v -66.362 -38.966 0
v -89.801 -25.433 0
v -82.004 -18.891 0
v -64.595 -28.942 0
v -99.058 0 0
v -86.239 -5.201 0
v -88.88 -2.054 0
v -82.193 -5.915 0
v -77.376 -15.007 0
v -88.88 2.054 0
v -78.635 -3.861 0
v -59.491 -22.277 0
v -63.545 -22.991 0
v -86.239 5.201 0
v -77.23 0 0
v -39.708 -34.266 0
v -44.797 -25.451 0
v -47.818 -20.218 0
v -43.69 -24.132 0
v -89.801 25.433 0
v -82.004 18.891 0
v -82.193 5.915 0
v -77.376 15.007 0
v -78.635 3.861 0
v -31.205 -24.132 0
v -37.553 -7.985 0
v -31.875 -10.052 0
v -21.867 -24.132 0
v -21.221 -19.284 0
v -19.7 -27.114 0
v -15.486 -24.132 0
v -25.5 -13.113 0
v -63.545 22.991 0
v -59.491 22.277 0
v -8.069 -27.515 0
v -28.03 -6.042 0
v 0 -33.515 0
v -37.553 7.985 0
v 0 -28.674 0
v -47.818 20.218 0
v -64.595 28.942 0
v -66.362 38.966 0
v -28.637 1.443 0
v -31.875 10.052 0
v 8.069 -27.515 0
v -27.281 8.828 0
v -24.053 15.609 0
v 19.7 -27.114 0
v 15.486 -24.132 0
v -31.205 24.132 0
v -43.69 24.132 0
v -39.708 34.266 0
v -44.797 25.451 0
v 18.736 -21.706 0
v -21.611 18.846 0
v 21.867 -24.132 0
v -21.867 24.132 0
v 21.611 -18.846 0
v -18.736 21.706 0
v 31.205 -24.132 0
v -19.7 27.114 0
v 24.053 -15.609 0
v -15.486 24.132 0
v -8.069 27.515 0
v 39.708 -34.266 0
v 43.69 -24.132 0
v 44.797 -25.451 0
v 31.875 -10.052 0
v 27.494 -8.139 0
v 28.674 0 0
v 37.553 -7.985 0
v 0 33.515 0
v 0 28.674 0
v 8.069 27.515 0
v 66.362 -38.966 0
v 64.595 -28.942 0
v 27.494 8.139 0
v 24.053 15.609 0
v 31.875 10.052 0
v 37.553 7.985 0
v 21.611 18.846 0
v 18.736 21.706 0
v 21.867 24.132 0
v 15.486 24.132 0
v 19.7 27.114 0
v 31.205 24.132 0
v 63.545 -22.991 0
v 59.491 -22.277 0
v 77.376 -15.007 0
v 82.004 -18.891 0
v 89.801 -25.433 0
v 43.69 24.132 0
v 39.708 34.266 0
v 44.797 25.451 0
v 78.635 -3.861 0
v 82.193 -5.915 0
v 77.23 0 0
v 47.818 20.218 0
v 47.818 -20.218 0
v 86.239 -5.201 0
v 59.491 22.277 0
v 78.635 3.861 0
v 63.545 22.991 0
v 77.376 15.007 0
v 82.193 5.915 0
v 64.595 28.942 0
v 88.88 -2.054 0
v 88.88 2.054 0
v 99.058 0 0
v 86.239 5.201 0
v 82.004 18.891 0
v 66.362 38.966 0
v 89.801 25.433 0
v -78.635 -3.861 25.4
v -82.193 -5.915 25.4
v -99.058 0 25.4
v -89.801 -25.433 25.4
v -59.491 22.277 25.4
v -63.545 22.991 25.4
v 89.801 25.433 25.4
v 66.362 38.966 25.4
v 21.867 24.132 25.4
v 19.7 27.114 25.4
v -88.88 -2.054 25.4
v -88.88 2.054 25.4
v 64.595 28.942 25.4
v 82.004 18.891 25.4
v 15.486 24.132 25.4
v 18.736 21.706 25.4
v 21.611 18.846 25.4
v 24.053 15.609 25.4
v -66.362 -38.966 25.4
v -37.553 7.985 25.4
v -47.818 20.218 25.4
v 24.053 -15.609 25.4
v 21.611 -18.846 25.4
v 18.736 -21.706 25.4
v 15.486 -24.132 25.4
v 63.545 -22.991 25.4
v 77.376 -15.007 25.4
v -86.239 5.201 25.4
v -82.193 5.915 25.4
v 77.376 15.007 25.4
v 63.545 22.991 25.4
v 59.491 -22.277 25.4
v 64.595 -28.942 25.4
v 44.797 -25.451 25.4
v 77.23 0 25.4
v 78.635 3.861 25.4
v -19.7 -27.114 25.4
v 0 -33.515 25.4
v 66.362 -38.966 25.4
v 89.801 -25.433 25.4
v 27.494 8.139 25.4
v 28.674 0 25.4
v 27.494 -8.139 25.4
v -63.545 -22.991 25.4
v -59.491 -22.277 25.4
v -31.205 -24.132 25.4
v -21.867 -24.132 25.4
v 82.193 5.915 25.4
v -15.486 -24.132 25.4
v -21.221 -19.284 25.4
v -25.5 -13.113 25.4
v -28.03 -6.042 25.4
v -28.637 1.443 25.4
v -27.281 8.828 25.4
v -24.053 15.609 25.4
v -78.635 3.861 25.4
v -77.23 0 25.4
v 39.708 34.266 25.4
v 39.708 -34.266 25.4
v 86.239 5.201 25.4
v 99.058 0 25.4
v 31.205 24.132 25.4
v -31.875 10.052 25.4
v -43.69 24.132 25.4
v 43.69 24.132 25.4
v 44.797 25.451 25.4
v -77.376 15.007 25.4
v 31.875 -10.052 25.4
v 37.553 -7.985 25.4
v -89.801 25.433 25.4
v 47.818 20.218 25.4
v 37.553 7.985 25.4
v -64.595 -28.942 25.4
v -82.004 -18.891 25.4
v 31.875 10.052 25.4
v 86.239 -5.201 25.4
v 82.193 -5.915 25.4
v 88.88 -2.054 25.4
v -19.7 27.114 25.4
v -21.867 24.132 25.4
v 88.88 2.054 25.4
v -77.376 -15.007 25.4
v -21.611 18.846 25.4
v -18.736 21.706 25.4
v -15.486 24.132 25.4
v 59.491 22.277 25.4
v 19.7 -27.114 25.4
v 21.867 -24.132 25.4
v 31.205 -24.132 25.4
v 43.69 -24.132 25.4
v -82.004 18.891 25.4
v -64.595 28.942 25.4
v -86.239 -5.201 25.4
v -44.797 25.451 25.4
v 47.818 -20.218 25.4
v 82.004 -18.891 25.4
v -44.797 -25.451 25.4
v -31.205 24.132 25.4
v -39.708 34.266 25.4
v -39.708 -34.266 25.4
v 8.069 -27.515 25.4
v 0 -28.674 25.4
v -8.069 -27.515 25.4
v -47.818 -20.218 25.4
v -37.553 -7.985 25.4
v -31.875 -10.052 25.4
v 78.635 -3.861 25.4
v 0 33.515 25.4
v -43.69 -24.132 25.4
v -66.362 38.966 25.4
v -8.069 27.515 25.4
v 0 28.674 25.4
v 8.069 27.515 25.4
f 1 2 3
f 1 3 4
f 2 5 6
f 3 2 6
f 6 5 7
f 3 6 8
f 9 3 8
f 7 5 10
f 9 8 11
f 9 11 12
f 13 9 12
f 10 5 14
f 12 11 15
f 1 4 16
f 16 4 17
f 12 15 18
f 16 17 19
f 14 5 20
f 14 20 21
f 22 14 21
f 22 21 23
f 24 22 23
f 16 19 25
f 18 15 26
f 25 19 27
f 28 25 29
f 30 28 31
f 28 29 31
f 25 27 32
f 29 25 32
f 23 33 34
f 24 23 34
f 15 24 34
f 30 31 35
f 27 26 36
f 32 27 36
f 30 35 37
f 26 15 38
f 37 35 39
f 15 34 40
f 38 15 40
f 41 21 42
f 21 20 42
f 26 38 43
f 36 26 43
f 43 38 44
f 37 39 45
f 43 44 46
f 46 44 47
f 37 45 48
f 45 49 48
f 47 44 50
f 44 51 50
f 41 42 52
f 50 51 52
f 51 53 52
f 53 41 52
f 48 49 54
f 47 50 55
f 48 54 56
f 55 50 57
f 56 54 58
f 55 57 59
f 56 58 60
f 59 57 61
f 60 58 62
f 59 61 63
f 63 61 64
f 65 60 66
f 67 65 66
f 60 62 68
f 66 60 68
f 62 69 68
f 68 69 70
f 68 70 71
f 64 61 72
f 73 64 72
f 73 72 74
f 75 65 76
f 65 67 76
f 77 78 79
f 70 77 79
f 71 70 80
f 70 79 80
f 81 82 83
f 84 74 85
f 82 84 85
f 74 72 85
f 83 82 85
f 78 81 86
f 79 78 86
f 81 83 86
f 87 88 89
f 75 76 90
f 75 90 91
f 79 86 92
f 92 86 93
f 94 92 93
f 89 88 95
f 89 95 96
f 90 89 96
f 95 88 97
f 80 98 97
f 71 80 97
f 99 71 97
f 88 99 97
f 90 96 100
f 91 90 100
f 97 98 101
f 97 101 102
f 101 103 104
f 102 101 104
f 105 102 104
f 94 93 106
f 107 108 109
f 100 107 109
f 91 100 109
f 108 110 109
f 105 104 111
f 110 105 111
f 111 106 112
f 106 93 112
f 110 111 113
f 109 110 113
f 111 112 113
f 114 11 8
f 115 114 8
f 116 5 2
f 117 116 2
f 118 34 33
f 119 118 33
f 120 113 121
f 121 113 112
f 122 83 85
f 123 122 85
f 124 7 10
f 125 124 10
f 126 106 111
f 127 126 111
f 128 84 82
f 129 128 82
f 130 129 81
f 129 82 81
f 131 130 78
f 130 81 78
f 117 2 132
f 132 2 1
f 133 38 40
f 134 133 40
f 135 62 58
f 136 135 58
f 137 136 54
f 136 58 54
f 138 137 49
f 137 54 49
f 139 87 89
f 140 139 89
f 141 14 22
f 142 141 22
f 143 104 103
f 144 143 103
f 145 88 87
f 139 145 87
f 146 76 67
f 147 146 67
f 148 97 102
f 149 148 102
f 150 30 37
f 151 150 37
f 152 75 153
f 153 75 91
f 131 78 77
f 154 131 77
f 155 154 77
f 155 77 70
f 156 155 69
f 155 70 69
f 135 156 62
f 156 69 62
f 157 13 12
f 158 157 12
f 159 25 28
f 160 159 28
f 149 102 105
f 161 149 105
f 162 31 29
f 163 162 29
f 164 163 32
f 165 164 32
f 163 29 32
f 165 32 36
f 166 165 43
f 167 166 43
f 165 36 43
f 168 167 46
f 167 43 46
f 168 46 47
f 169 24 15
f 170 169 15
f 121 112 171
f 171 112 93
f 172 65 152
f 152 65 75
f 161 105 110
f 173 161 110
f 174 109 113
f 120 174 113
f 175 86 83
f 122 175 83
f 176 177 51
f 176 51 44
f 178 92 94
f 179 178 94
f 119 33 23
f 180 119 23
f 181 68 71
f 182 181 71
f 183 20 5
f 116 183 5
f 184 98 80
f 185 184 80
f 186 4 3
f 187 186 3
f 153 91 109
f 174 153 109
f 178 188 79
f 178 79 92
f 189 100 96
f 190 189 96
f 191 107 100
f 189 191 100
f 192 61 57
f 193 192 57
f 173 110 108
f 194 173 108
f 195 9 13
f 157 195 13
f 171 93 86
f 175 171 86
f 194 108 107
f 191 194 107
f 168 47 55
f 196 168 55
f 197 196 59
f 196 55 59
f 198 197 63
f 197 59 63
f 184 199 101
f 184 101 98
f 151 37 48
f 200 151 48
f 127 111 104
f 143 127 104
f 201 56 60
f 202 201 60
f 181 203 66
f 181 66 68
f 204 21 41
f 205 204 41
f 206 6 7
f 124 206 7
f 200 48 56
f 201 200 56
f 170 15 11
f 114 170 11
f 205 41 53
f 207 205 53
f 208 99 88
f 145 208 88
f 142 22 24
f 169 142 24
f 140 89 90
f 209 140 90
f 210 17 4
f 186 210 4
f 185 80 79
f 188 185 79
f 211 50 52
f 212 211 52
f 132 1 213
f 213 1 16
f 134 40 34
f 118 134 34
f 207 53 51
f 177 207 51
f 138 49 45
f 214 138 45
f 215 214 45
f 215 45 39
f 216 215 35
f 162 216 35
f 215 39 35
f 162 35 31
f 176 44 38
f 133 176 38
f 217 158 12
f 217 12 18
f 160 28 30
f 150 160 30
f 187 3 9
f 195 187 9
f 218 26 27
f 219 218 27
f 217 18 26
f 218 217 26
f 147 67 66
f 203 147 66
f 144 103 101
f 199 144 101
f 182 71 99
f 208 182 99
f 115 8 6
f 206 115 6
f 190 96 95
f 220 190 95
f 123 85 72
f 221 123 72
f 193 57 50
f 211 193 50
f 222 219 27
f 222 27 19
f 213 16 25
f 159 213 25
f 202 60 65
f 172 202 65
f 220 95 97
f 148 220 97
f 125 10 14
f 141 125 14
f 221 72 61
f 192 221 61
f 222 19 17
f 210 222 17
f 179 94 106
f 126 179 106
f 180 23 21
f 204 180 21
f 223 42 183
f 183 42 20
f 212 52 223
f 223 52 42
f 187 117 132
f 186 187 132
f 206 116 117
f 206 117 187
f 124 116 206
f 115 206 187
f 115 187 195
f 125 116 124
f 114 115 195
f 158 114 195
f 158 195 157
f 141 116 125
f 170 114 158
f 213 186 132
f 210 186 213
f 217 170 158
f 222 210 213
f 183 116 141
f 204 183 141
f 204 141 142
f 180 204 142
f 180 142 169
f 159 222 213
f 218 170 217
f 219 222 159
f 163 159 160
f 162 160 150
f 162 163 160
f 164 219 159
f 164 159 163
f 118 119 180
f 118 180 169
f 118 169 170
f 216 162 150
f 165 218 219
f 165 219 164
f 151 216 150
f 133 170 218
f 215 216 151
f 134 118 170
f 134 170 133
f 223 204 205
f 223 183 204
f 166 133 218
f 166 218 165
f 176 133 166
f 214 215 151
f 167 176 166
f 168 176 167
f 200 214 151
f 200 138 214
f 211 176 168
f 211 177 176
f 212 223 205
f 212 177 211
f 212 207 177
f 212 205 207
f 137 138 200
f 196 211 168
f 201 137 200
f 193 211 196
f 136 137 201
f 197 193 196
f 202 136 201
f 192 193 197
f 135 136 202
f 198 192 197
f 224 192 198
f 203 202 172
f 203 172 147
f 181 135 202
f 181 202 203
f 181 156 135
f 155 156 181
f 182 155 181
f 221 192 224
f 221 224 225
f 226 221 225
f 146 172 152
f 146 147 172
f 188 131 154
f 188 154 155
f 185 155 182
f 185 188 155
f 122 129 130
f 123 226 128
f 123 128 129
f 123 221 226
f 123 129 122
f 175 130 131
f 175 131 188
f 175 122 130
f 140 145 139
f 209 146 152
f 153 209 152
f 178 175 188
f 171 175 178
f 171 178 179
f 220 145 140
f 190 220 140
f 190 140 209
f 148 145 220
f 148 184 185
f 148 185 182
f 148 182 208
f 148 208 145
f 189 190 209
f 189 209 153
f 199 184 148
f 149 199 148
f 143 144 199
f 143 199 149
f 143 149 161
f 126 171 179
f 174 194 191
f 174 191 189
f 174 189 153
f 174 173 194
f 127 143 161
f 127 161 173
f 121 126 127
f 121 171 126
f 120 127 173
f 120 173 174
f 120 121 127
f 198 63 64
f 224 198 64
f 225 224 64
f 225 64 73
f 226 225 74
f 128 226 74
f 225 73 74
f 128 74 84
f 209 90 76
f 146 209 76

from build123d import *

# Parameters (mm, degrees)
F1_DEPTH = 25.4
F2_DEPTH = 25.4
F3_DEPTH = 25.4


with BuildPart() as f1:
    # F0 (on Top) → F1 (new body)
    with BuildSketch(Plane.XY):
        Polygon((-63.5453270559, -22.991492829), (-59.4913065434, -22.2766596323), (-47.8182197106, -20.2183794755), (-37.5530794263, -7.9848616632), (-31.8749547005, -10.0515300498), (-31.8749547005, 0), (-31.8749547005, 10.0515300498), (-37.5530794263, 7.9848616632), (-47.8182197106, 20.2183794755), (-59.4913065434, 22.2766596323), (-63.5453270559, 22.991492829), (-77.3755131479, 15.0066311658), (-82.0043628348, 18.8906972309), (-64.5946020947, 28.9422272807), (-44.7969526493, 25.4513675289), (-43.689912716, 24.1320487112), (-31.2048222204, 24.1320487112), (-39.7079831372, 34.2657212821), (-66.3619826587, 38.9655405415), (-89.8011164668, 25.4329503278), (-99.0579533557, 0), (-89.8011164668, -25.4329503278), (-66.3619826587, -38.9655405415), (-39.7079831372, -34.2657212821), (-31.2048222204, -24.1320487112), (-43.689912716, -24.1320487112), (-44.7969526493, -25.4513675289), (-64.5946020947, -28.9422272807), (-82.0043628348, -18.8906972309), (-77.3755131479, -15.0066311658), align=None)
        Polygon((-78.6353386424, 3.8605894997), (-77.2301989778, 0), (-78.6353386424, -3.8605894997), (-82.1932771708, -5.9147662668), (-86.2392155834, -5.2013581624), (-88.8800143314, -2.0541767671), (-88.8800143314, 2.0541767671), (-86.2392155834, 5.2013581624), (-82.1932771708, 5.9147662668), align=None, mode=Mode.SUBTRACT)
        with BuildLine():
            Line((-31.8749547005, -10.0515300498), (-43.689912716, -24.1320487112))
            Line((-43.689912716, -24.1320487112), (-31.2048222204, -24.1320487112))
            Line((-31.2048222204, -24.1320487112), (-26.2000668961, -18.1676135733))
            Line((-26.2000668961, -18.1676135733), (-21.8666511129, -24.1320487112))
            Line((-21.8666511129, -24.1320487112), (-19.6998053948, -27.1144559821))
            Line((-19.6998053948, -27.1144559821), (0, -33.5153107669))
            Line((0, -33.5153107669), (19.6998053948, -27.1144559821))
            Line((19.6998053948, -27.1144559821), (21.8666511129, -24.1320487112))
            Line((21.8666511129, -24.1320487112), (26.2000668961, -18.1676135733))
            Line((26.2000668961, -18.1676135733), (31.2048222204, -24.1320487112))
            Line((31.2048222204, -24.1320487112), (39.7079831372, -34.2657212821))
            Line((39.7079831372, -34.2657212821), (66.3619826587, -38.9655405415))
            Line((66.3619826587, -38.9655405415), (89.8011164668, -25.4329503278))
            Line((89.8011164668, -25.4329503278), (99.0579533557, 0))
            Line((99.0579533557, 0), (89.8011164668, 25.4329503278))
            Line((89.8011164668, 25.4329503278), (66.3619826587, 38.9655405415))
            Line((66.3619826587, 38.9655405415), (39.7079831372, 34.2657212821))
            Line((39.7079831372, 34.2657212821), (31.2048222204, 24.1320487112))
            Line((31.2048222204, 24.1320487112), (26.2000668961, 18.1676135733))
            Line((26.2000668961, 18.1676135733), (31.8749547005, 10.3568005987))
            Line((31.8749547005, 10.3568005987), (31.8749547005, 10.0515300498))
            Line((31.8749547005, 10.0515300498), (31.8749547005, 0))
            Line((31.8749547005, 0), (28.6737279915, 0))
            ThreePointArc((28.6737279915, 0), (27.4942890604, -8.1392104036), (24.053000194, -15.6088391176))
            ThreePointArc((24.053000194, -15.6088391176), (20.22377915, -20.3268648302), (15.4863456611, -24.1320487112))
            ThreePointArc((15.4863456611, -24.1320487112), (0, -28.6737279915), (-15.4863456611, -24.1320487112))
            ThreePointArc((-15.4863456611, -24.1320487112), (-25.1618157135, -13.7501166152), (-28.6737279915, 0))
            Line((-28.6737279915, 0), (-31.8749547005, 0))
            Line((-31.8749547005, 0), (-31.8749547005, -10.0515300498))
        make_face()
        Polygon((43.689912716, -24.1320487112), (31.8749547005, -10.0515300498), (37.5530794263, -7.9848616632), (47.8182197106, -20.2183794755), (59.4913065434, -22.2766596323), (63.5453270559, -22.991492829), (77.3755131479, -15.0066311658), (82.0043628348, -18.8906972309), (64.5946020947, -28.9422272807), (44.7969526493, -25.4513675289), align=None, mode=Mode.SUBTRACT)
        Polygon((78.6353386424, -3.8605894997), (77.2301989778, 0), (78.6353386424, 3.8605894997), (82.1932771708, 5.9147662668), (86.2392155834, 5.2013581624), (88.8800143314, 2.0541767671), (88.8800143314, -2.0541767671), (86.2392155834, -5.2013581624), (82.1932771708, -5.9147662668), align=None, mode=Mode.SUBTRACT)
        Polygon((37.5530794263, 7.9848616632), (31.8749547005, 10.0515300498), (43.689912716, 24.1320487112), (44.7969526493, 25.4513675289), (64.5946020947, 28.9422272807), (82.0043628348, 18.8906972309), (77.3755131479, 15.0066311658), (63.5453270559, 22.991492829), (59.4913065434, 22.2766596323), (47.8182197106, 20.2183794755), align=None, mode=Mode.SUBTRACT)
        Polygon((-26.2000668961, -18.1676135733), (-31.2048222204, -24.1320487112), (-21.8666511129, -24.1320487112), align=None)
        with BuildLine():
            Line((-31.8749547005, 10.0515300498), (-31.8749547005, 0))
            Line((-31.8749547005, 0), (-28.6737279915, 0))
            ThreePointArc((-28.6737279915, 0), (-27.4942890604, 8.1392104036), (-24.053000194, 15.6088391176))
            ThreePointArc((-24.053000194, 15.6088391176), (-20.22377915, 20.3268648302), (-15.4863456611, 24.1320487112))
            ThreePointArc((-15.4863456611, 24.1320487112), (0, 28.6737279915), (15.4863456611, 24.1320487112))
            ThreePointArc((15.4863456611, 24.1320487112), (20.22377915, 20.3268648302), (24.053000194, 15.6088391176))
            ThreePointArc((24.053000194, 15.6088391176), (27.4942890604, 8.1392104036), (28.6737279915, 0))
            Line((28.6737279915, 0), (31.8749547005, 0))
            Line((31.8749547005, 0), (31.8749547005, 10.0515300498))
            Line((31.8749547005, 10.0515300498), (31.8749547005, 10.3568005987))
            Line((31.8749547005, 10.3568005987), (26.2000668961, 18.1676135733))
            Line((26.2000668961, 18.1676135733), (21.8666511129, 24.1320487112))
            Line((21.8666511129, 24.1320487112), (19.6998053948, 27.1144559821))
            Line((19.6998053948, 27.1144559821), (0, 33.5153107669))
            Line((0, 33.5153107669), (-19.6998053948, 27.1144559821))
            Line((-19.6998053948, 27.1144559821), (-21.8666511129, 24.1320487112))
            Line((-21.8666511129, 24.1320487112), (-26.2000668961, 18.1676135733))
            Line((-26.2000668961, 18.1676135733), (-31.2048222204, 24.1320487112))
            Line((-31.2048222204, 24.1320487112), (-43.689912716, 24.1320487112))
            Line((-43.689912716, 24.1320487112), (-31.8749547005, 10.0515300498))
        make_face()
        Polygon((-21.8666511129, 24.1320487112), (-31.2048222204, 24.1320487112), (-26.2000668961, 18.1676135733), align=None)
        Polygon((26.2000668961, -18.1676135733), (21.8666511129, -24.1320487112), (31.2048222204, -24.1320487112), align=None)
        Polygon((21.8666511129, 24.1320487112), (26.2000668961, 18.1676135733), (31.2048222204, 24.1320487112), align=None)
    extrude(amount=F1_DEPTH)

    # F0 (on Top) → F2 (join)
    with BuildSketch(Plane.XY):
        Polygon((-63.5453270559, -22.991492829), (-59.4913065434, -22.2766596323), (-47.8182197106, -20.2183794755), (-37.5530794263, -7.9848616632), (-31.8749547005, -10.0515300498), (-31.8749547005, 0), (-31.8749547005, 10.0515300498), (-37.5530794263, 7.9848616632), (-47.8182197106, 20.2183794755), (-59.4913065434, 22.2766596323), (-63.5453270559, 22.991492829), (-77.3755131479, 15.0066311658), (-82.0043628348, 18.8906972309), (-64.5946020947, 28.9422272807), (-44.7969526493, 25.4513675289), (-43.689912716, 24.1320487112), (-31.2048222204, 24.1320487112), (-39.7079831372, 34.2657212821), (-66.3619826587, 38.9655405415), (-89.8011164668, 25.4329503278), (-99.0579533557, 0), (-89.8011164668, -25.4329503278), (-66.3619826587, -38.9655405415), (-39.7079831372, -34.2657212821), (-31.2048222204, -24.1320487112), (-43.689912716, -24.1320487112), (-44.7969526493, -25.4513675289), (-64.5946020947, -28.9422272807), (-82.0043628348, -18.8906972309), (-77.3755131479, -15.0066311658), align=None)
        Polygon((-78.6353386424, 3.8605894997), (-77.2301989778, 0), (-78.6353386424, -3.8605894997), (-82.1932771708, -5.9147662668), (-86.2392155834, -5.2013581624), (-88.8800143314, -2.0541767671), (-88.8800143314, 2.0541767671), (-86.2392155834, 5.2013581624), (-82.1932771708, 5.9147662668), align=None, mode=Mode.SUBTRACT)
        with BuildLine():
            Line((-31.8749547005, -10.0515300498), (-43.689912716, -24.1320487112))
            Line((-43.689912716, -24.1320487112), (-31.2048222204, -24.1320487112))
            Line((-31.2048222204, -24.1320487112), (-26.2000668961, -18.1676135733))
            Line((-26.2000668961, -18.1676135733), (-21.8666511129, -24.1320487112))
            Line((-21.8666511129, -24.1320487112), (-19.6998053948, -27.1144559821))
            Line((-19.6998053948, -27.1144559821), (0, -33.5153107669))
            Line((0, -33.5153107669), (19.6998053948, -27.1144559821))
            Line((19.6998053948, -27.1144559821), (21.8666511129, -24.1320487112))
            Line((21.8666511129, -24.1320487112), (26.2000668961, -18.1676135733))
            Line((26.2000668961, -18.1676135733), (31.2048222204, -24.1320487112))
            Line((31.2048222204, -24.1320487112), (39.7079831372, -34.2657212821))
            Line((39.7079831372, -34.2657212821), (66.3619826587, -38.9655405415))
            Line((66.3619826587, -38.9655405415), (89.8011164668, -25.4329503278))
            Line((89.8011164668, -25.4329503278), (99.0579533557, 0))
            Line((99.0579533557, 0), (89.8011164668, 25.4329503278))
            Line((89.8011164668, 25.4329503278), (66.3619826587, 38.9655405415))
            Line((66.3619826587, 38.9655405415), (39.7079831372, 34.2657212821))
            Line((39.7079831372, 34.2657212821), (31.2048222204, 24.1320487112))
            Line((31.2048222204, 24.1320487112), (26.2000668961, 18.1676135733))
            Line((26.2000668961, 18.1676135733), (31.8749547005, 10.3568005987))
            Line((31.8749547005, 10.3568005987), (31.8749547005, 10.0515300498))
            Line((31.8749547005, 10.0515300498), (31.8749547005, 0))
            Line((31.8749547005, 0), (28.6737279915, 0))
            ThreePointArc((28.6737279915, 0), (27.4942890604, -8.1392104036), (24.053000194, -15.6088391176))
            ThreePointArc((24.053000194, -15.6088391176), (20.22377915, -20.3268648302), (15.4863456611, -24.1320487112))
            ThreePointArc((15.4863456611, -24.1320487112), (0, -28.6737279915), (-15.4863456611, -24.1320487112))
            ThreePointArc((-15.4863456611, -24.1320487112), (-25.1618157135, -13.7501166152), (-28.6737279915, 0))
            Line((-28.6737279915, 0), (-31.8749547005, 0))
            Line((-31.8749547005, 0), (-31.8749547005, -10.0515300498))
        make_face()
        Polygon((43.689912716, -24.1320487112), (31.8749547005, -10.0515300498), (37.5530794263, -7.9848616632), (47.8182197106, -20.2183794755), (59.4913065434, -22.2766596323), (63.5453270559, -22.991492829), (77.3755131479, -15.0066311658), (82.0043628348, -18.8906972309), (64.5946020947, -28.9422272807), (44.7969526493, -25.4513675289), align=None, mode=Mode.SUBTRACT)
        Polygon((78.6353386424, -3.8605894997), (77.2301989778, 0), (78.6353386424, 3.8605894997), (82.1932771708, 5.9147662668), (86.2392155834, 5.2013581624), (88.8800143314, 2.0541767671), (88.8800143314, -2.0541767671), (86.2392155834, -5.2013581624), (82.1932771708, -5.9147662668), align=None, mode=Mode.SUBTRACT)
        Polygon((37.5530794263, 7.9848616632), (31.8749547005, 10.0515300498), (43.689912716, 24.1320487112), (44.7969526493, 25.4513675289), (64.5946020947, 28.9422272807), (82.0043628348, 18.8906972309), (77.3755131479, 15.0066311658), (63.5453270559, 22.991492829), (59.4913065434, 22.2766596323), (47.8182197106, 20.2183794755), align=None, mode=Mode.SUBTRACT)
        Polygon((-26.2000668961, -18.1676135733), (-31.2048222204, -24.1320487112), (-21.8666511129, -24.1320487112), align=None)
        with BuildLine():
            Line((-31.8749547005, 10.0515300498), (-31.8749547005, 0))
            Line((-31.8749547005, 0), (-28.6737279915, 0))
            ThreePointArc((-28.6737279915, 0), (-27.4942890604, 8.1392104036), (-24.053000194, 15.6088391176))
            ThreePointArc((-24.053000194, 15.6088391176), (-20.22377915, 20.3268648302), (-15.4863456611, 24.1320487112))
            ThreePointArc((-15.4863456611, 24.1320487112), (0, 28.6737279915), (15.4863456611, 24.1320487112))
            ThreePointArc((15.4863456611, 24.1320487112), (20.22377915, 20.3268648302), (24.053000194, 15.6088391176))
            ThreePointArc((24.053000194, 15.6088391176), (27.4942890604, 8.1392104036), (28.6737279915, 0))
            Line((28.6737279915, 0), (31.8749547005, 0))
            Line((31.8749547005, 0), (31.8749547005, 10.0515300498))
            Line((31.8749547005, 10.0515300498), (31.8749547005, 10.3568005987))
            Line((31.8749547005, 10.3568005987), (26.2000668961, 18.1676135733))
            Line((26.2000668961, 18.1676135733), (21.8666511129, 24.1320487112))
            Line((21.8666511129, 24.1320487112), (19.6998053948, 27.1144559821))
            Line((19.6998053948, 27.1144559821), (0, 33.5153107669))
            Line((0, 33.5153107669), (-19.6998053948, 27.1144559821))
            Line((-19.6998053948, 27.1144559821), (-21.8666511129, 24.1320487112))
            Line((-21.8666511129, 24.1320487112), (-26.2000668961, 18.1676135733))
            Line((-26.2000668961, 18.1676135733), (-31.2048222204, 24.1320487112))
            Line((-31.2048222204, 24.1320487112), (-43.689912716, 24.1320487112))
            Line((-43.689912716, 24.1320487112), (-31.8749547005, 10.0515300498))
        make_face()
        Polygon((-21.8666511129, 24.1320487112), (-31.2048222204, 24.1320487112), (-26.2000668961, 18.1676135733), align=None)
        Polygon((26.2000668961, -18.1676135733), (21.8666511129, -24.1320487112), (31.2048222204, -24.1320487112), align=None)
        Polygon((21.8666511129, 24.1320487112), (26.2000668961, 18.1676135733), (31.2048222204, 24.1320487112), align=None)
    extrude(amount=F2_DEPTH)

    # F0 (on Top) → F3 (join)
    with BuildSketch(Plane.XY):
        Polygon((-63.5453270559, -22.991492829), (-59.4913065434, -22.2766596323), (-47.8182197106, -20.2183794755), (-37.5530794263, -7.9848616632), (-31.8749547005, -10.0515300498), (-31.8749547005, 0), (-31.8749547005, 10.0515300498), (-37.5530794263, 7.9848616632), (-47.8182197106, 20.2183794755), (-59.4913065434, 22.2766596323), (-63.5453270559, 22.991492829), (-77.3755131479, 15.0066311658), (-82.0043628348, 18.8906972309), (-64.5946020947, 28.9422272807), (-44.7969526493, 25.4513675289), (-43.689912716, 24.1320487112), (-31.2048222204, 24.1320487112), (-39.7079831372, 34.2657212821), (-66.3619826587, 38.9655405415), (-89.8011164668, 25.4329503278), (-99.0579533557, 0), (-89.8011164668, -25.4329503278), (-66.3619826587, -38.9655405415), (-39.7079831372, -34.2657212821), (-31.2048222204, -24.1320487112), (-43.689912716, -24.1320487112), (-44.7969526493, -25.4513675289), (-64.5946020947, -28.9422272807), (-82.0043628348, -18.8906972309), (-77.3755131479, -15.0066311658), align=None)
        Polygon((-78.6353386424, 3.8605894997), (-77.2301989778, 0), (-78.6353386424, -3.8605894997), (-82.1932771708, -5.9147662668), (-86.2392155834, -5.2013581624), (-88.8800143314, -2.0541767671), (-88.8800143314, 2.0541767671), (-86.2392155834, 5.2013581624), (-82.1932771708, 5.9147662668), align=None, mode=Mode.SUBTRACT)
        with BuildLine():
            Line((-31.8749547005, -10.0515300498), (-43.689912716, -24.1320487112))
            Line((-43.689912716, -24.1320487112), (-31.2048222204, -24.1320487112))
            Line((-31.2048222204, -24.1320487112), (-26.2000668961, -18.1676135733))
            Line((-26.2000668961, -18.1676135733), (-21.8666511129, -24.1320487112))
            Line((-21.8666511129, -24.1320487112), (-19.6998053948, -27.1144559821))
            Line((-19.6998053948, -27.1144559821), (0, -33.5153107669))
            Line((0, -33.5153107669), (19.6998053948, -27.1144559821))
            Line((19.6998053948, -27.1144559821), (21.8666511129, -24.1320487112))
            Line((21.8666511129, -24.1320487112), (26.2000668961, -18.1676135733))
            Line((26.2000668961, -18.1676135733), (31.2048222204, -24.1320487112))
            Line((31.2048222204, -24.1320487112), (39.7079831372, -34.2657212821))
            Line((39.7079831372, -34.2657212821), (66.3619826587, -38.9655405415))
            Line((66.3619826587, -38.9655405415), (89.8011164668, -25.4329503278))
            Line((89.8011164668, -25.4329503278), (99.0579533557, 0))
            Line((99.0579533557, 0), (89.8011164668, 25.4329503278))
            Line((89.8011164668, 25.4329503278), (66.3619826587, 38.9655405415))
            Line((66.3619826587, 38.9655405415), (39.7079831372, 34.2657212821))
            Line((39.7079831372, 34.2657212821), (31.2048222204, 24.1320487112))
            Line((31.2048222204, 24.1320487112), (26.2000668961, 18.1676135733))
            Line((26.2000668961, 18.1676135733), (31.8749547005, 10.3568005987))
            Line((31.8749547005, 10.3568005987), (31.8749547005, 10.0515300498))
            Line((31.8749547005, 10.0515300498), (31.8749547005, 0))
            Line((31.8749547005, 0), (28.6737279915, 0))
            ThreePointArc((28.6737279915, 0), (27.4942890604, -8.1392104036), (24.053000194, -15.6088391176))
            ThreePointArc((24.053000194, -15.6088391176), (20.22377915, -20.3268648302), (15.4863456611, -24.1320487112))
            ThreePointArc((15.4863456611, -24.1320487112), (0, -28.6737279915), (-15.4863456611, -24.1320487112))
            ThreePointArc((-15.4863456611, -24.1320487112), (-25.1618157135, -13.7501166152), (-28.6737279915, 0))
            Line((-28.6737279915, 0), (-31.8749547005, 0))
            Line((-31.8749547005, 0), (-31.8749547005, -10.0515300498))
        make_face()
        Polygon((43.689912716, -24.1320487112), (31.8749547005, -10.0515300498), (37.5530794263, -7.9848616632), (47.8182197106, -20.2183794755), (59.4913065434, -22.2766596323), (63.5453270559, -22.991492829), (77.3755131479, -15.0066311658), (82.0043628348, -18.8906972309), (64.5946020947, -28.9422272807), (44.7969526493, -25.4513675289), align=None, mode=Mode.SUBTRACT)
        Polygon((78.6353386424, -3.8605894997), (77.2301989778, 0), (78.6353386424, 3.8605894997), (82.1932771708, 5.9147662668), (86.2392155834, 5.2013581624), (88.8800143314, 2.0541767671), (88.8800143314, -2.0541767671), (86.2392155834, -5.2013581624), (82.1932771708, -5.9147662668), align=None, mode=Mode.SUBTRACT)
        Polygon((37.5530794263, 7.9848616632), (31.8749547005, 10.0515300498), (43.689912716, 24.1320487112), (44.7969526493, 25.4513675289), (64.5946020947, 28.9422272807), (82.0043628348, 18.8906972309), (77.3755131479, 15.0066311658), (63.5453270559, 22.991492829), (59.4913065434, 22.2766596323), (47.8182197106, 20.2183794755), align=None, mode=Mode.SUBTRACT)
        Polygon((-26.2000668961, -18.1676135733), (-31.2048222204, -24.1320487112), (-21.8666511129, -24.1320487112), align=None)
        with BuildLine():
            Line((-31.8749547005, 10.0515300498), (-31.8749547005, 0))
            Line((-31.8749547005, 0), (-28.6737279915, 0))
            ThreePointArc((-28.6737279915, 0), (-27.4942890604, 8.1392104036), (-24.053000194, 15.6088391176))
            ThreePointArc((-24.053000194, 15.6088391176), (-20.22377915, 20.3268648302), (-15.4863456611, 24.1320487112))
            ThreePointArc((-15.4863456611, 24.1320487112), (0, 28.6737279915), (15.4863456611, 24.1320487112))
            ThreePointArc((15.4863456611, 24.1320487112), (20.22377915, 20.3268648302), (24.053000194, 15.6088391176))
            ThreePointArc((24.053000194, 15.6088391176), (27.4942890604, 8.1392104036), (28.6737279915, 0))
            Line((28.6737279915, 0), (31.8749547005, 0))
            Line((31.8749547005, 0), (31.8749547005, 10.0515300498))
            Line((31.8749547005, 10.0515300498), (31.8749547005, 10.3568005987))
            Line((31.8749547005, 10.3568005987), (26.2000668961, 18.1676135733))
            Line((26.2000668961, 18.1676135733), (21.8666511129, 24.1320487112))
            Line((21.8666511129, 24.1320487112), (19.6998053948, 27.1144559821))
            Line((19.6998053948, 27.1144559821), (0, 33.5153107669))
            Line((0, 33.5153107669), (-19.6998053948, 27.1144559821))
            Line((-19.6998053948, 27.1144559821), (-21.8666511129, 24.1320487112))
            Line((-21.8666511129, 24.1320487112), (-26.2000668961, 18.1676135733))
            Line((-26.2000668961, 18.1676135733), (-31.2048222204, 24.1320487112))
            Line((-31.2048222204, 24.1320487112), (-43.689912716, 24.1320487112))
            Line((-43.689912716, 24.1320487112), (-31.8749547005, 10.0515300498))
        make_face()
        Polygon((-21.8666511129, 24.1320487112), (-31.2048222204, 24.1320487112), (-26.2000668961, 18.1676135733), align=None)
        Polygon((26.2000668961, -18.1676135733), (21.8666511129, -24.1320487112), (31.2048222204, -24.1320487112), align=None)
        Polygon((21.8666511129, 24.1320487112), (26.2000668961, 18.1676135733), (31.2048222204, 24.1320487112), align=None)
    extrude(amount=F3_DEPTH)


solid = f1.part
